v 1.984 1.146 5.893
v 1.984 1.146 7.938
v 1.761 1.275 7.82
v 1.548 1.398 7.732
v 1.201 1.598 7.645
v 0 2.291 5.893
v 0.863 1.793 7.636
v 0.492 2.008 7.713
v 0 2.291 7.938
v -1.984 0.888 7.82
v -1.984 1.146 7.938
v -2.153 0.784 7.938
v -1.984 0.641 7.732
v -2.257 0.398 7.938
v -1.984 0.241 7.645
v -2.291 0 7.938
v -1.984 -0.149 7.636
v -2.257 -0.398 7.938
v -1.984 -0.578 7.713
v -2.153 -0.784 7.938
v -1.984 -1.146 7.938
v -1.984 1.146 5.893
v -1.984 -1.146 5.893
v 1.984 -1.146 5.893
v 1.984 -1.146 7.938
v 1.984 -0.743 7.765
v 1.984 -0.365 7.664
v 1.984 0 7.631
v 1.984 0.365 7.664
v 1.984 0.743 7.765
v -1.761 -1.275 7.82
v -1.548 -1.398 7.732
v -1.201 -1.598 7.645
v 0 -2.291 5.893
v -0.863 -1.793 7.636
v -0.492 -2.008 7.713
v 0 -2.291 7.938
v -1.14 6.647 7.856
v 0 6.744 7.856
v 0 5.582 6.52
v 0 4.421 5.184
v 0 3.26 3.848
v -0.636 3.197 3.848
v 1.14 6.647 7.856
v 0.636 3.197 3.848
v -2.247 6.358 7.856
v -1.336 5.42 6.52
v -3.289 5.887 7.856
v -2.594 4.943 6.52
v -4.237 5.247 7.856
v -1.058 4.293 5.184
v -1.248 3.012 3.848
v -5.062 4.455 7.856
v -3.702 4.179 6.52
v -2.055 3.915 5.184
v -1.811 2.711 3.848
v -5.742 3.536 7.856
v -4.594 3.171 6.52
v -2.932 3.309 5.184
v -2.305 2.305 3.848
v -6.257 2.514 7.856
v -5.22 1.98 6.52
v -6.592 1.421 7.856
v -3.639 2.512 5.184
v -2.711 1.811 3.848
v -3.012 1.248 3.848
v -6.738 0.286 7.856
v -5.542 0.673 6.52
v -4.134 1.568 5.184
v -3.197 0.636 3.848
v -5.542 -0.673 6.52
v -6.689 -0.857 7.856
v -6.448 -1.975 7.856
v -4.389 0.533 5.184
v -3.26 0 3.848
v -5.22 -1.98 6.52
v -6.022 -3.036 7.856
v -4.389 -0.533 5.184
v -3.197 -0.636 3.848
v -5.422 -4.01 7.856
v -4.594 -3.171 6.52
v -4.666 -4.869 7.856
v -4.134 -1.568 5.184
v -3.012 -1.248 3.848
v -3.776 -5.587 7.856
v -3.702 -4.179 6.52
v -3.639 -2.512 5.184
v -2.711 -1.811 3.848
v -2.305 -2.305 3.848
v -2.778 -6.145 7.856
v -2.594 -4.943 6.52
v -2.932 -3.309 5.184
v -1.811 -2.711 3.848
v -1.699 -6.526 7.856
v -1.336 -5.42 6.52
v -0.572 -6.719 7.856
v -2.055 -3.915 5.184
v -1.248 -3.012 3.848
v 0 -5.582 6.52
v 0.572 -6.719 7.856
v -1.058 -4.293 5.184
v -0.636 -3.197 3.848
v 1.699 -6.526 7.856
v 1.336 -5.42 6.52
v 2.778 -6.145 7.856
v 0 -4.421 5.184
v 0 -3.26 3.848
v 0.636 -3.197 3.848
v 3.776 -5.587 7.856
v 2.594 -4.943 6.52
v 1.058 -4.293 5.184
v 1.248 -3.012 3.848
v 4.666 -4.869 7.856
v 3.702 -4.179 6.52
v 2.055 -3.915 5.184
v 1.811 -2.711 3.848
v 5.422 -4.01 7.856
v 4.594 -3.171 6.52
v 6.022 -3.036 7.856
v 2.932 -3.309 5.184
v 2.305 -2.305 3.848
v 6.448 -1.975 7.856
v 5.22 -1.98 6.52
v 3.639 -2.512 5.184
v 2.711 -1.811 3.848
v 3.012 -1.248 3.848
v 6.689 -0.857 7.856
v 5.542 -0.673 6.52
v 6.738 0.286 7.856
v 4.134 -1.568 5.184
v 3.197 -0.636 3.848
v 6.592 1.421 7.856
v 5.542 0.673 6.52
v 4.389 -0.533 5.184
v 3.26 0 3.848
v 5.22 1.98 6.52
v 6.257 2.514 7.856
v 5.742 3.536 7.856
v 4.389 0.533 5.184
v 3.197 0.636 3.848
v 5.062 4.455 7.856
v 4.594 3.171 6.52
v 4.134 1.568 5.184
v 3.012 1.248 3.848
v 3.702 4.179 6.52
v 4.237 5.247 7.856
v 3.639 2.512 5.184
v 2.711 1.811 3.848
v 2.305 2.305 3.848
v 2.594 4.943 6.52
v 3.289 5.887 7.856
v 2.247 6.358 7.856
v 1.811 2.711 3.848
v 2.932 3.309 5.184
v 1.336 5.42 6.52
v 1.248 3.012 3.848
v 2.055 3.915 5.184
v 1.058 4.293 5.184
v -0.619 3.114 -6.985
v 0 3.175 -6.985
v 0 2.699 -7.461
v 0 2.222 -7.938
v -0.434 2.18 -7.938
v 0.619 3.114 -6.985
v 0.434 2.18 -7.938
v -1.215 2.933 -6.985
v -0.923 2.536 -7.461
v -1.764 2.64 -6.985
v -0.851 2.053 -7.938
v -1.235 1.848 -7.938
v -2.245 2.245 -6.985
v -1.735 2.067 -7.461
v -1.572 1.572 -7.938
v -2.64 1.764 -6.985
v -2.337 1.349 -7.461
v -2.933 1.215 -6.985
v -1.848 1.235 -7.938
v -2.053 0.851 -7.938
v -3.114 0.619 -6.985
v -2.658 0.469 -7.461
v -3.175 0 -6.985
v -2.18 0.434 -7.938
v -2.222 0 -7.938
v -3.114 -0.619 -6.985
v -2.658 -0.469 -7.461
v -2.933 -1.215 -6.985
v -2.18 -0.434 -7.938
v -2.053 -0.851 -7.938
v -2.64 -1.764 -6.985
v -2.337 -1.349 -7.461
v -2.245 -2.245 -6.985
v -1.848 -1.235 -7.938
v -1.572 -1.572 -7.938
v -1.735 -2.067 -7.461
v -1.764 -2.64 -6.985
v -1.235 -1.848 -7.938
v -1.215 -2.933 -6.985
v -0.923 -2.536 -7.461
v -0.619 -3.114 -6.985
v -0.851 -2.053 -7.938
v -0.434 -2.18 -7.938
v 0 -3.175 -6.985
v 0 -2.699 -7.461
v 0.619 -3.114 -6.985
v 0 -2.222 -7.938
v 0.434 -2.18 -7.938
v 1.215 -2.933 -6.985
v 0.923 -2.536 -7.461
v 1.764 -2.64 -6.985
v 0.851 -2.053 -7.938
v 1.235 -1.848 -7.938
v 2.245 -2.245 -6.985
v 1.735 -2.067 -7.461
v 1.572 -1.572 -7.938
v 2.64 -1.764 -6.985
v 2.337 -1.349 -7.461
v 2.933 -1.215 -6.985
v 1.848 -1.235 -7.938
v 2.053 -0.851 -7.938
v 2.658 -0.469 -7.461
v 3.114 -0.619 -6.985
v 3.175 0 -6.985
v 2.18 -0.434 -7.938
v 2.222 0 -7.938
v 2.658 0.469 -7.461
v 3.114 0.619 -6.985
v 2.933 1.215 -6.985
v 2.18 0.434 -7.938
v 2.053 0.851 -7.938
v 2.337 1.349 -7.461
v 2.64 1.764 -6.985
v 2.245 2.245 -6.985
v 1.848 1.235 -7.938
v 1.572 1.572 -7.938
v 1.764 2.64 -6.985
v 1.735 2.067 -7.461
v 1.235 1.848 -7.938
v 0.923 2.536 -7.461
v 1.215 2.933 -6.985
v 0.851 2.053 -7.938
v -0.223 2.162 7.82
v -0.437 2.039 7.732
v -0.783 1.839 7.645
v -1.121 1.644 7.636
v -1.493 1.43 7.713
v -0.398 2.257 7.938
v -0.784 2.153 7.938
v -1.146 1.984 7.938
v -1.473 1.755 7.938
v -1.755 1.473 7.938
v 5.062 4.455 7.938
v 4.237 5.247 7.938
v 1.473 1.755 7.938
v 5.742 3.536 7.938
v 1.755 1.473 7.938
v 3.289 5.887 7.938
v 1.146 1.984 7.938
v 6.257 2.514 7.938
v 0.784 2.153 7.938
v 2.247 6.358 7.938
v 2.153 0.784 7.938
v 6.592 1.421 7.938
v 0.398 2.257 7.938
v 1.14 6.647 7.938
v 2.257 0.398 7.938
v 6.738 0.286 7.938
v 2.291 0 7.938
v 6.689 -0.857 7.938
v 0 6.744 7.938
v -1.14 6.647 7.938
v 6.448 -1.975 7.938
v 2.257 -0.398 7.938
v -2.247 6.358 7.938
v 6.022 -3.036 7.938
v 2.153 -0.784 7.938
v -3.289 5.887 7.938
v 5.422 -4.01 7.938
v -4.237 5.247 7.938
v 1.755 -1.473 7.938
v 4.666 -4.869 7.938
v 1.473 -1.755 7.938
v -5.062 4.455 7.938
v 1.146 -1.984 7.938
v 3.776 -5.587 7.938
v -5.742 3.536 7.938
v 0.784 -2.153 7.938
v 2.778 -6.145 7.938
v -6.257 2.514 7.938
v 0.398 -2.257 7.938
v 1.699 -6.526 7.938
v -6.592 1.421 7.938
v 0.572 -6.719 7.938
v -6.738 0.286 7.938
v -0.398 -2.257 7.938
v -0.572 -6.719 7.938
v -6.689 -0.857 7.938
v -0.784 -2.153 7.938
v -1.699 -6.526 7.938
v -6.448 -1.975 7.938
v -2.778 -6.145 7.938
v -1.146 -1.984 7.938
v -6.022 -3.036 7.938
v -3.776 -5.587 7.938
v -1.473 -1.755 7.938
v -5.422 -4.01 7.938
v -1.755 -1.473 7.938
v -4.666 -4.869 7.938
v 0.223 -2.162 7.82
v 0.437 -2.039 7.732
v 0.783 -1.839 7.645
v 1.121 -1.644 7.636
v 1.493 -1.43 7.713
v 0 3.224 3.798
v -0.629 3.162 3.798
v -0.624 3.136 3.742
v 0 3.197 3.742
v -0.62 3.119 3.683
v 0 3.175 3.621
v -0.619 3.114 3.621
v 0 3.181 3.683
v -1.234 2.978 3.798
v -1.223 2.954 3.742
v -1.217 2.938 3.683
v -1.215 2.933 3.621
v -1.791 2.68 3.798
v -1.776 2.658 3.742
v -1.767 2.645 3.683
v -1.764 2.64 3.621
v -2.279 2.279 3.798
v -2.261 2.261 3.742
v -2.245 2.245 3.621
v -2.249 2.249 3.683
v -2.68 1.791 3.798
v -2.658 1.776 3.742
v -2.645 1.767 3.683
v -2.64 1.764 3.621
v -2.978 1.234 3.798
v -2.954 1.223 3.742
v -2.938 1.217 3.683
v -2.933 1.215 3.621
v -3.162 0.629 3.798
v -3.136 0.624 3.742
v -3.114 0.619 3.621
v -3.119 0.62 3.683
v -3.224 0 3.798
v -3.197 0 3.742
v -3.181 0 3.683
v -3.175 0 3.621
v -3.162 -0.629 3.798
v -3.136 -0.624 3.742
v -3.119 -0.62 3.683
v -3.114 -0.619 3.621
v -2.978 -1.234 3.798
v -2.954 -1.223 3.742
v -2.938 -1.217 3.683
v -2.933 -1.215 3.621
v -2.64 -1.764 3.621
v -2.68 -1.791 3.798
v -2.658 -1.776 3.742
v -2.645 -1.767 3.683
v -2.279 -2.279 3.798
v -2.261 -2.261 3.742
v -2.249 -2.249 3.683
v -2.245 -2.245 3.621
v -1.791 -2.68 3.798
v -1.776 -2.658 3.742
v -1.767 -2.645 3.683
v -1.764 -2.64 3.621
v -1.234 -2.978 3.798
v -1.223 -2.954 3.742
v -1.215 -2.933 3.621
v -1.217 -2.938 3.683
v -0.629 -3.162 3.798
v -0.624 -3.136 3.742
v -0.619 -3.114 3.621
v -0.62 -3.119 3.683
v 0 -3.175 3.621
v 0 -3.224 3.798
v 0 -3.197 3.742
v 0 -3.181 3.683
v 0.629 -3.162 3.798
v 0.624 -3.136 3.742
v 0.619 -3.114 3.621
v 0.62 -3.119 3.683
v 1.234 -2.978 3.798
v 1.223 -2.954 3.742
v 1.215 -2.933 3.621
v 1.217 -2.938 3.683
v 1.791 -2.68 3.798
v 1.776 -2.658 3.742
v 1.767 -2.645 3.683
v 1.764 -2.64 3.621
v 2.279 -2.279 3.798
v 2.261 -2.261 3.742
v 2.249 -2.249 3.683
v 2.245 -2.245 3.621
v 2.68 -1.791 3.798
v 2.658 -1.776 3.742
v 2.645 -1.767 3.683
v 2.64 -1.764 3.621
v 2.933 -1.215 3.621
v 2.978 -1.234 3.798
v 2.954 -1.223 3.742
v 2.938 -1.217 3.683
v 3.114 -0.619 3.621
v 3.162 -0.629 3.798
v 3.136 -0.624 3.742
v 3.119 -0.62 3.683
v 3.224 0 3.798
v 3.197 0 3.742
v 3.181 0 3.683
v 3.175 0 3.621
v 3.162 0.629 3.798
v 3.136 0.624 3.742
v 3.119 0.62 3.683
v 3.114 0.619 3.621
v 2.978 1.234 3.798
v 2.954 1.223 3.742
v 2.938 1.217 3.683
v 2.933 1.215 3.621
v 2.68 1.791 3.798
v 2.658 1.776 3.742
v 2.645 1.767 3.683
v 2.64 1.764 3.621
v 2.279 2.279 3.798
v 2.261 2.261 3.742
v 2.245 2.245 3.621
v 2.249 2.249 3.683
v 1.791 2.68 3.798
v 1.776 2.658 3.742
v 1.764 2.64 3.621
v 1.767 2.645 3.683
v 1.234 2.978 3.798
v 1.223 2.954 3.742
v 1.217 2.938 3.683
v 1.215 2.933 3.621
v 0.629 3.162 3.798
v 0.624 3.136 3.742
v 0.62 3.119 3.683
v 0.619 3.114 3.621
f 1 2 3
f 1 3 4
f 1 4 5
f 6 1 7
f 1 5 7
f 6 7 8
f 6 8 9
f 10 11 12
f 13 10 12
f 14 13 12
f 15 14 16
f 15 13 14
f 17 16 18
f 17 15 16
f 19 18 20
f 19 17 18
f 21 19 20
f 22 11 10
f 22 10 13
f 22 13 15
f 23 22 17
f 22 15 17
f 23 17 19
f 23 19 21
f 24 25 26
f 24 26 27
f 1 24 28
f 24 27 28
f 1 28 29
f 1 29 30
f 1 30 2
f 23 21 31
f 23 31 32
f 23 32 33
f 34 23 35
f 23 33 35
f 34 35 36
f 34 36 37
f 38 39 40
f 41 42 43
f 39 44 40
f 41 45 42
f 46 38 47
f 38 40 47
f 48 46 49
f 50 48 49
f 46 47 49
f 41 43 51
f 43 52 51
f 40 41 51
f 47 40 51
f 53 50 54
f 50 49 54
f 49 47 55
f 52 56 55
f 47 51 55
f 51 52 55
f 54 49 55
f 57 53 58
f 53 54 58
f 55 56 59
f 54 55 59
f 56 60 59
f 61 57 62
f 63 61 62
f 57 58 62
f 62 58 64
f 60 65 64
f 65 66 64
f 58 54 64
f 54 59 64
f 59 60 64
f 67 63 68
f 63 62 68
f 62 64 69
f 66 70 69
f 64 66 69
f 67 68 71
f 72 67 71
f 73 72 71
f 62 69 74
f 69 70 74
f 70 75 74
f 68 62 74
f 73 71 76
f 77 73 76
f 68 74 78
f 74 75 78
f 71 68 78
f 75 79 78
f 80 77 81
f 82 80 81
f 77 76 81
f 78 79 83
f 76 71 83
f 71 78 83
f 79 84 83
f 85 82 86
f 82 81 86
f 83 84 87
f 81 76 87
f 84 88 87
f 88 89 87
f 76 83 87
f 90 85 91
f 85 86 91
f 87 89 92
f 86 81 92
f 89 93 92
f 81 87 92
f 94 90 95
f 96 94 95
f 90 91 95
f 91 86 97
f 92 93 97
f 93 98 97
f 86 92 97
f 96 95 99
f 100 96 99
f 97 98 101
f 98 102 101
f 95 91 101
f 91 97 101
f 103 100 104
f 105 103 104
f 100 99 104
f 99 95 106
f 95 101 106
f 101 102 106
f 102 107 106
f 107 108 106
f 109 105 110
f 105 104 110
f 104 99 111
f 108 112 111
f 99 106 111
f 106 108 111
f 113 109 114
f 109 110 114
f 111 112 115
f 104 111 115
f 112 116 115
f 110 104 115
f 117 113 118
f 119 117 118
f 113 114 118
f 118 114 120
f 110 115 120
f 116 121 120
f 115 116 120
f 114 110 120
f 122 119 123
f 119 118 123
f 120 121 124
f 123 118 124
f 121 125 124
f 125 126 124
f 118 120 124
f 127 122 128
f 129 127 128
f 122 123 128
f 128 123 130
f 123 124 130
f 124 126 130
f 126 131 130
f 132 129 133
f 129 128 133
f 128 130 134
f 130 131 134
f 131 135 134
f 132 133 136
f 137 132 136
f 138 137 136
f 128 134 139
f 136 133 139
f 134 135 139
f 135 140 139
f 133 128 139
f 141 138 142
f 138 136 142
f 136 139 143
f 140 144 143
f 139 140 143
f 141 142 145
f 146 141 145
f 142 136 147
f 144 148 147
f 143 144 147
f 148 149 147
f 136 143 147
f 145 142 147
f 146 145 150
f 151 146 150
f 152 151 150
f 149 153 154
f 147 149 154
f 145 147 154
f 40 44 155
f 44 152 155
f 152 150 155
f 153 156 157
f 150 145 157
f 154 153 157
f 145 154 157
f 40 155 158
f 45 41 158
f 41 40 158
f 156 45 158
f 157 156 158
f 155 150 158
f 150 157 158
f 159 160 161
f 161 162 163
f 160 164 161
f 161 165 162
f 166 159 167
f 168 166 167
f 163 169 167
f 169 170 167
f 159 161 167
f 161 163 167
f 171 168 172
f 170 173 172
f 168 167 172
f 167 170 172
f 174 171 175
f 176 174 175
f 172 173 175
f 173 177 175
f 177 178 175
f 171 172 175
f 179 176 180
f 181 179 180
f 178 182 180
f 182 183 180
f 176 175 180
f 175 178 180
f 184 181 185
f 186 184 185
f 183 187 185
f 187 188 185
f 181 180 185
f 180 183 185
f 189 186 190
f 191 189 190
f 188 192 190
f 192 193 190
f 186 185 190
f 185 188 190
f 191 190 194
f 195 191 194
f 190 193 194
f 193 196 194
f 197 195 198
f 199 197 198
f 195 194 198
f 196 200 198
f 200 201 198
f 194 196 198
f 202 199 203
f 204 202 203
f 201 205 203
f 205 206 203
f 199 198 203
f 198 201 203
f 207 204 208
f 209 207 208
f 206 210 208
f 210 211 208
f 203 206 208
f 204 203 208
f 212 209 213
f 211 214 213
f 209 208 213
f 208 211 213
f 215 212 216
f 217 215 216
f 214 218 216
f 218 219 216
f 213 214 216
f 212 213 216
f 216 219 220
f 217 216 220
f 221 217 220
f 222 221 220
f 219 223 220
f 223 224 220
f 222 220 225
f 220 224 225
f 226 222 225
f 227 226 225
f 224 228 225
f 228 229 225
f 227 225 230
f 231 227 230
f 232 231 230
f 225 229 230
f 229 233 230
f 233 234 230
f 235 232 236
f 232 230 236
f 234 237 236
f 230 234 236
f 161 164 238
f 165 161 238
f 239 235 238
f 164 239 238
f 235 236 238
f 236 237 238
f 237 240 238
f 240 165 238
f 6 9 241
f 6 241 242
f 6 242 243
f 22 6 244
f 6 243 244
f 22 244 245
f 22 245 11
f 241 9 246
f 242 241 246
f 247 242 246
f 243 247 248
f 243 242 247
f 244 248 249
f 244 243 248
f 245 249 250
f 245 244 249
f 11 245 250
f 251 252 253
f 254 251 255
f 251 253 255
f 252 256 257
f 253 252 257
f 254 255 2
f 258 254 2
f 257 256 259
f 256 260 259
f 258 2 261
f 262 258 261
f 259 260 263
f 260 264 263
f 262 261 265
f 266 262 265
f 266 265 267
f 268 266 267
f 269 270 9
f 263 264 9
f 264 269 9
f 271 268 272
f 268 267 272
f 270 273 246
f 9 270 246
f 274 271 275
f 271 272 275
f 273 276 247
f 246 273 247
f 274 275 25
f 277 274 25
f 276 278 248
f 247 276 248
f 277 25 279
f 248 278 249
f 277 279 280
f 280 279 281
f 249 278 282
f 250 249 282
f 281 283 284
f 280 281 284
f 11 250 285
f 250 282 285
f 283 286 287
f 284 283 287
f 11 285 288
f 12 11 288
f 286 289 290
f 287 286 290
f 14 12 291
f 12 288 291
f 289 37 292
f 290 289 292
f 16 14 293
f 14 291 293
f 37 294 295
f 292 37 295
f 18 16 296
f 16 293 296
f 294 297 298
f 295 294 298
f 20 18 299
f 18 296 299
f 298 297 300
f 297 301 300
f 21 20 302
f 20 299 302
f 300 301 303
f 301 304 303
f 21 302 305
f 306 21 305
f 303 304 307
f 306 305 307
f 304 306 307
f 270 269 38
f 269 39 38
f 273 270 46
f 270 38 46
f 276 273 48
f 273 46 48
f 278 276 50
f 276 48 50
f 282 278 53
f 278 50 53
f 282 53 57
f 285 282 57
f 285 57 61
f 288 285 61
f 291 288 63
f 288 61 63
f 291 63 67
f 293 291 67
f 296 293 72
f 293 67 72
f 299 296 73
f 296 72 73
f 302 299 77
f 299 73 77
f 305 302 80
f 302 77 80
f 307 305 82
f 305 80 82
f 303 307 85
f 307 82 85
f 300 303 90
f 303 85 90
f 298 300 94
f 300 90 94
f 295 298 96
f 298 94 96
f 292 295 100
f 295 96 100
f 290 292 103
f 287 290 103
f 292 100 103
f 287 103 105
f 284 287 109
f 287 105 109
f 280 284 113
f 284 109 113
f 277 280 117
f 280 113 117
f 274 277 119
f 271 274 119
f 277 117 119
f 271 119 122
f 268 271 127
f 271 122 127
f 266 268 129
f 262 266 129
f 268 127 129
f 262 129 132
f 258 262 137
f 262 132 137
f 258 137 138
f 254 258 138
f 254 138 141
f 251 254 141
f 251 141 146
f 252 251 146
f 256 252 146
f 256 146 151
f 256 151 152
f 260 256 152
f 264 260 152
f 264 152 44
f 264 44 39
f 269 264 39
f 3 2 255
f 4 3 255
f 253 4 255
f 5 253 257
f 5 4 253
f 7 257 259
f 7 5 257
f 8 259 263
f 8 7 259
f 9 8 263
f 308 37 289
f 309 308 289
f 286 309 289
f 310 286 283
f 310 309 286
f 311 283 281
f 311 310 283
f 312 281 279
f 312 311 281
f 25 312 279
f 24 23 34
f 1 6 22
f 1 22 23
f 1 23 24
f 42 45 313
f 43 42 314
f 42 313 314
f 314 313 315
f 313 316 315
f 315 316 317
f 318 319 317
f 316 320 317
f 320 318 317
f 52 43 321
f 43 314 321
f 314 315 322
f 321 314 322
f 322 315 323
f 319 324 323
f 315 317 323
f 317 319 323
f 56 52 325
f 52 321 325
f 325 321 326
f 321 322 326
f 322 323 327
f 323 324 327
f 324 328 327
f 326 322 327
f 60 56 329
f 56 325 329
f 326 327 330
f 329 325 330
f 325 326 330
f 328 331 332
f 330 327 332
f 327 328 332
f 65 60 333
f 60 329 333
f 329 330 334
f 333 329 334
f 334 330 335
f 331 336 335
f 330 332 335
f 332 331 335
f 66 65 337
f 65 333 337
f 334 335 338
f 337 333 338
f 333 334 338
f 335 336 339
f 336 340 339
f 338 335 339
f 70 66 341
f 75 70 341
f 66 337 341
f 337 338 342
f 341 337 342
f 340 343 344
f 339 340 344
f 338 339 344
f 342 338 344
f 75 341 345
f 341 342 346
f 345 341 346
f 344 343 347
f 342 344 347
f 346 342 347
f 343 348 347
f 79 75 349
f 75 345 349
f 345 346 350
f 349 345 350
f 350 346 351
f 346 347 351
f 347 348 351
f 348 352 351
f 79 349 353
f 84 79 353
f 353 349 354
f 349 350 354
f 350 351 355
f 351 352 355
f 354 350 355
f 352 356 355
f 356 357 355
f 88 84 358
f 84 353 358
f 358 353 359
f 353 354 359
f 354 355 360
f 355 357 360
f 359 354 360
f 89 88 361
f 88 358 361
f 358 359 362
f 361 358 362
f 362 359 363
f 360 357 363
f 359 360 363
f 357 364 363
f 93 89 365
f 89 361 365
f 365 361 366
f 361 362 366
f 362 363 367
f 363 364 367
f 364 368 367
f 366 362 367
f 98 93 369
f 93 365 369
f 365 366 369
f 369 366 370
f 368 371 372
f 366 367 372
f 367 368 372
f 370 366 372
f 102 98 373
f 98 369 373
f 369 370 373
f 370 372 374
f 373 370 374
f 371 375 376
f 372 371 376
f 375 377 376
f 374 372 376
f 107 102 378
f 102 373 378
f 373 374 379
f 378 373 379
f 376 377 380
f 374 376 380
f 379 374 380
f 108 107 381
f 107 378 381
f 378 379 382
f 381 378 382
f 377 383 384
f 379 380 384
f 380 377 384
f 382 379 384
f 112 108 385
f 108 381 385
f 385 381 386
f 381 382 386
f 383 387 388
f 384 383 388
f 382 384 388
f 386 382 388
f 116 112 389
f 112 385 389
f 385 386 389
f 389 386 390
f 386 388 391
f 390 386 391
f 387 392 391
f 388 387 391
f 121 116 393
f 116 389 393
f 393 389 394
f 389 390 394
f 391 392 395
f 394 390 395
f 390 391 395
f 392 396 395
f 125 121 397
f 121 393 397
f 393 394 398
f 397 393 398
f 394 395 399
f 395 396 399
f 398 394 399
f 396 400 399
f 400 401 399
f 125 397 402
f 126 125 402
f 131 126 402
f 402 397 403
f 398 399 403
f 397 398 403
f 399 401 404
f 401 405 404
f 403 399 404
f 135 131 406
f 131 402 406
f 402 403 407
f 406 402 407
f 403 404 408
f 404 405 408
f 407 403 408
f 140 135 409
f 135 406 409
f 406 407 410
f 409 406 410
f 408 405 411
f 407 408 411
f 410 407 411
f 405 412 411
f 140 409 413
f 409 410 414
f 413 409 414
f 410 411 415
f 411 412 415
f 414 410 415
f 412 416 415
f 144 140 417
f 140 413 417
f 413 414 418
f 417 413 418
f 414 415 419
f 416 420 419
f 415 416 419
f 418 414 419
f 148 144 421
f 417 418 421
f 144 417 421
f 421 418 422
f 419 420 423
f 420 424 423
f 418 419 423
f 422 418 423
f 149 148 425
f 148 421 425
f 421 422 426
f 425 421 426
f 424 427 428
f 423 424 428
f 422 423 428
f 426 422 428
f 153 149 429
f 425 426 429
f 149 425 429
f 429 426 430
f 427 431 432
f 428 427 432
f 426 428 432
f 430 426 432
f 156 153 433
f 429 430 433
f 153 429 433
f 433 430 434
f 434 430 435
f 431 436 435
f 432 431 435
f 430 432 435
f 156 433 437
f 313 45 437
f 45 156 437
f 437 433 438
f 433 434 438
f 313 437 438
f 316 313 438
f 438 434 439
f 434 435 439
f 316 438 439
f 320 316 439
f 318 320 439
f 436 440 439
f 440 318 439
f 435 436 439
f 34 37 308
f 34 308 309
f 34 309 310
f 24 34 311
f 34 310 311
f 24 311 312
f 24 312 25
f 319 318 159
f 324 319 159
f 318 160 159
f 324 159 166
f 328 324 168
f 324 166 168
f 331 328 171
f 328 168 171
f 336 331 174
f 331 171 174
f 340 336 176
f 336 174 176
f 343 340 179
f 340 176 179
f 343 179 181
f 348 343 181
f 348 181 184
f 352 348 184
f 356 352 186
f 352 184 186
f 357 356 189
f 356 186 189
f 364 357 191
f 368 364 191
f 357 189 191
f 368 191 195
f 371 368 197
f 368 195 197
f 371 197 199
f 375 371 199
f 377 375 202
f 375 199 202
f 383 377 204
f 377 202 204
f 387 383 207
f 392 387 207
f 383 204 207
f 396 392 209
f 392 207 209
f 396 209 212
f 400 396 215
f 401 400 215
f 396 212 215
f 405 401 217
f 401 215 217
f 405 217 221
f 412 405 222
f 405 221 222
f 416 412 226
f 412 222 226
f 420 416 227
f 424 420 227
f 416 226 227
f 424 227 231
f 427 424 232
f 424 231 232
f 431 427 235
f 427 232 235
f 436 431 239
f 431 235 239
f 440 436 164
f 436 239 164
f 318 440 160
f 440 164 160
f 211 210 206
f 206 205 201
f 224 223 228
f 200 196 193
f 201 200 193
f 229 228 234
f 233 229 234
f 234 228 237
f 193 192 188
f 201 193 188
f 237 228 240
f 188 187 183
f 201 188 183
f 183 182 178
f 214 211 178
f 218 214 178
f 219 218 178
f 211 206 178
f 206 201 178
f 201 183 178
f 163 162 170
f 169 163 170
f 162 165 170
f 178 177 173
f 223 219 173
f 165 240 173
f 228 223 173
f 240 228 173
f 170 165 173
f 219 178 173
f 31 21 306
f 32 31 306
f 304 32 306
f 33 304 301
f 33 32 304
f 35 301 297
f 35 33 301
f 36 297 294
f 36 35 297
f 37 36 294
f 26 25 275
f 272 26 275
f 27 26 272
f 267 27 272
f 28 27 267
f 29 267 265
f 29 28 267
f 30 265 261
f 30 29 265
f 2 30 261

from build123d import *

# Parameters (mm, degrees)
SKETCH10_R         = 2.291358881
CUT_EXTRUDE2_DEPTH = 2.0447
CUT_EXTRUDE2_TAPER = 45
CUT_EXTRUDE1_DEPTH = 2.0447


with BuildPart() as part:
    # Sketch11 → Revolve1 (revolve)
    with BuildSketch(Plane(origin=(0, 0, 0), x_dir=(0, 0, -1), z_dir=(1, 0, 0))):
        with BuildLine():
            Line((-7.855712, 6.7437), (-3.8481, 3.259936038))
            ThreePointArc((-3.8481, 3.259936038), (-3.742193592, 3.196928347), (-3.620928247, 3.175))
            Line((-3.620928247, 3.175), (6.985, 3.175))
            Line((6.985, 3.175), (7.9375, 2.2225))
            Line((7.9375, 2.2225), (7.9375, 0))
            Line((7.9375, 0), (-7.9375, 0))
            Line((-7.9375, 0), (-7.9375, 6.7437))
            Line((-7.9375, 6.7437), (-7.855712, 6.7437))
        make_face()
    revolve(axis=Axis((0, 0, -7.9375), (0, 0, 1)))

    # Sketch10 → Cut-Extrude2 (cut)
    with BuildSketch(Plane.XY.offset(7.9375)):
        Circle(SKETCH10_R)
    extrude(amount=-CUT_EXTRUDE2_DEPTH, taper=CUT_EXTRUDE2_TAPER, mode=Mode.SUBTRACT)

    # Sketch9 → Cut-Extrude1 (cut)
    with BuildSketch(Plane.XY.offset(7.9375)):
        Polygon((1.984375, -1.14567944), (1.984375, 1.14567944), (0, 2.291358881), (-1.984375, 1.14567944), (-1.984375, -1.14567944), (0, -2.291358881), align=None)
    extrude(amount=-CUT_EXTRUDE1_DEPTH, mode=Mode.SUBTRACT)


solid = part.part
